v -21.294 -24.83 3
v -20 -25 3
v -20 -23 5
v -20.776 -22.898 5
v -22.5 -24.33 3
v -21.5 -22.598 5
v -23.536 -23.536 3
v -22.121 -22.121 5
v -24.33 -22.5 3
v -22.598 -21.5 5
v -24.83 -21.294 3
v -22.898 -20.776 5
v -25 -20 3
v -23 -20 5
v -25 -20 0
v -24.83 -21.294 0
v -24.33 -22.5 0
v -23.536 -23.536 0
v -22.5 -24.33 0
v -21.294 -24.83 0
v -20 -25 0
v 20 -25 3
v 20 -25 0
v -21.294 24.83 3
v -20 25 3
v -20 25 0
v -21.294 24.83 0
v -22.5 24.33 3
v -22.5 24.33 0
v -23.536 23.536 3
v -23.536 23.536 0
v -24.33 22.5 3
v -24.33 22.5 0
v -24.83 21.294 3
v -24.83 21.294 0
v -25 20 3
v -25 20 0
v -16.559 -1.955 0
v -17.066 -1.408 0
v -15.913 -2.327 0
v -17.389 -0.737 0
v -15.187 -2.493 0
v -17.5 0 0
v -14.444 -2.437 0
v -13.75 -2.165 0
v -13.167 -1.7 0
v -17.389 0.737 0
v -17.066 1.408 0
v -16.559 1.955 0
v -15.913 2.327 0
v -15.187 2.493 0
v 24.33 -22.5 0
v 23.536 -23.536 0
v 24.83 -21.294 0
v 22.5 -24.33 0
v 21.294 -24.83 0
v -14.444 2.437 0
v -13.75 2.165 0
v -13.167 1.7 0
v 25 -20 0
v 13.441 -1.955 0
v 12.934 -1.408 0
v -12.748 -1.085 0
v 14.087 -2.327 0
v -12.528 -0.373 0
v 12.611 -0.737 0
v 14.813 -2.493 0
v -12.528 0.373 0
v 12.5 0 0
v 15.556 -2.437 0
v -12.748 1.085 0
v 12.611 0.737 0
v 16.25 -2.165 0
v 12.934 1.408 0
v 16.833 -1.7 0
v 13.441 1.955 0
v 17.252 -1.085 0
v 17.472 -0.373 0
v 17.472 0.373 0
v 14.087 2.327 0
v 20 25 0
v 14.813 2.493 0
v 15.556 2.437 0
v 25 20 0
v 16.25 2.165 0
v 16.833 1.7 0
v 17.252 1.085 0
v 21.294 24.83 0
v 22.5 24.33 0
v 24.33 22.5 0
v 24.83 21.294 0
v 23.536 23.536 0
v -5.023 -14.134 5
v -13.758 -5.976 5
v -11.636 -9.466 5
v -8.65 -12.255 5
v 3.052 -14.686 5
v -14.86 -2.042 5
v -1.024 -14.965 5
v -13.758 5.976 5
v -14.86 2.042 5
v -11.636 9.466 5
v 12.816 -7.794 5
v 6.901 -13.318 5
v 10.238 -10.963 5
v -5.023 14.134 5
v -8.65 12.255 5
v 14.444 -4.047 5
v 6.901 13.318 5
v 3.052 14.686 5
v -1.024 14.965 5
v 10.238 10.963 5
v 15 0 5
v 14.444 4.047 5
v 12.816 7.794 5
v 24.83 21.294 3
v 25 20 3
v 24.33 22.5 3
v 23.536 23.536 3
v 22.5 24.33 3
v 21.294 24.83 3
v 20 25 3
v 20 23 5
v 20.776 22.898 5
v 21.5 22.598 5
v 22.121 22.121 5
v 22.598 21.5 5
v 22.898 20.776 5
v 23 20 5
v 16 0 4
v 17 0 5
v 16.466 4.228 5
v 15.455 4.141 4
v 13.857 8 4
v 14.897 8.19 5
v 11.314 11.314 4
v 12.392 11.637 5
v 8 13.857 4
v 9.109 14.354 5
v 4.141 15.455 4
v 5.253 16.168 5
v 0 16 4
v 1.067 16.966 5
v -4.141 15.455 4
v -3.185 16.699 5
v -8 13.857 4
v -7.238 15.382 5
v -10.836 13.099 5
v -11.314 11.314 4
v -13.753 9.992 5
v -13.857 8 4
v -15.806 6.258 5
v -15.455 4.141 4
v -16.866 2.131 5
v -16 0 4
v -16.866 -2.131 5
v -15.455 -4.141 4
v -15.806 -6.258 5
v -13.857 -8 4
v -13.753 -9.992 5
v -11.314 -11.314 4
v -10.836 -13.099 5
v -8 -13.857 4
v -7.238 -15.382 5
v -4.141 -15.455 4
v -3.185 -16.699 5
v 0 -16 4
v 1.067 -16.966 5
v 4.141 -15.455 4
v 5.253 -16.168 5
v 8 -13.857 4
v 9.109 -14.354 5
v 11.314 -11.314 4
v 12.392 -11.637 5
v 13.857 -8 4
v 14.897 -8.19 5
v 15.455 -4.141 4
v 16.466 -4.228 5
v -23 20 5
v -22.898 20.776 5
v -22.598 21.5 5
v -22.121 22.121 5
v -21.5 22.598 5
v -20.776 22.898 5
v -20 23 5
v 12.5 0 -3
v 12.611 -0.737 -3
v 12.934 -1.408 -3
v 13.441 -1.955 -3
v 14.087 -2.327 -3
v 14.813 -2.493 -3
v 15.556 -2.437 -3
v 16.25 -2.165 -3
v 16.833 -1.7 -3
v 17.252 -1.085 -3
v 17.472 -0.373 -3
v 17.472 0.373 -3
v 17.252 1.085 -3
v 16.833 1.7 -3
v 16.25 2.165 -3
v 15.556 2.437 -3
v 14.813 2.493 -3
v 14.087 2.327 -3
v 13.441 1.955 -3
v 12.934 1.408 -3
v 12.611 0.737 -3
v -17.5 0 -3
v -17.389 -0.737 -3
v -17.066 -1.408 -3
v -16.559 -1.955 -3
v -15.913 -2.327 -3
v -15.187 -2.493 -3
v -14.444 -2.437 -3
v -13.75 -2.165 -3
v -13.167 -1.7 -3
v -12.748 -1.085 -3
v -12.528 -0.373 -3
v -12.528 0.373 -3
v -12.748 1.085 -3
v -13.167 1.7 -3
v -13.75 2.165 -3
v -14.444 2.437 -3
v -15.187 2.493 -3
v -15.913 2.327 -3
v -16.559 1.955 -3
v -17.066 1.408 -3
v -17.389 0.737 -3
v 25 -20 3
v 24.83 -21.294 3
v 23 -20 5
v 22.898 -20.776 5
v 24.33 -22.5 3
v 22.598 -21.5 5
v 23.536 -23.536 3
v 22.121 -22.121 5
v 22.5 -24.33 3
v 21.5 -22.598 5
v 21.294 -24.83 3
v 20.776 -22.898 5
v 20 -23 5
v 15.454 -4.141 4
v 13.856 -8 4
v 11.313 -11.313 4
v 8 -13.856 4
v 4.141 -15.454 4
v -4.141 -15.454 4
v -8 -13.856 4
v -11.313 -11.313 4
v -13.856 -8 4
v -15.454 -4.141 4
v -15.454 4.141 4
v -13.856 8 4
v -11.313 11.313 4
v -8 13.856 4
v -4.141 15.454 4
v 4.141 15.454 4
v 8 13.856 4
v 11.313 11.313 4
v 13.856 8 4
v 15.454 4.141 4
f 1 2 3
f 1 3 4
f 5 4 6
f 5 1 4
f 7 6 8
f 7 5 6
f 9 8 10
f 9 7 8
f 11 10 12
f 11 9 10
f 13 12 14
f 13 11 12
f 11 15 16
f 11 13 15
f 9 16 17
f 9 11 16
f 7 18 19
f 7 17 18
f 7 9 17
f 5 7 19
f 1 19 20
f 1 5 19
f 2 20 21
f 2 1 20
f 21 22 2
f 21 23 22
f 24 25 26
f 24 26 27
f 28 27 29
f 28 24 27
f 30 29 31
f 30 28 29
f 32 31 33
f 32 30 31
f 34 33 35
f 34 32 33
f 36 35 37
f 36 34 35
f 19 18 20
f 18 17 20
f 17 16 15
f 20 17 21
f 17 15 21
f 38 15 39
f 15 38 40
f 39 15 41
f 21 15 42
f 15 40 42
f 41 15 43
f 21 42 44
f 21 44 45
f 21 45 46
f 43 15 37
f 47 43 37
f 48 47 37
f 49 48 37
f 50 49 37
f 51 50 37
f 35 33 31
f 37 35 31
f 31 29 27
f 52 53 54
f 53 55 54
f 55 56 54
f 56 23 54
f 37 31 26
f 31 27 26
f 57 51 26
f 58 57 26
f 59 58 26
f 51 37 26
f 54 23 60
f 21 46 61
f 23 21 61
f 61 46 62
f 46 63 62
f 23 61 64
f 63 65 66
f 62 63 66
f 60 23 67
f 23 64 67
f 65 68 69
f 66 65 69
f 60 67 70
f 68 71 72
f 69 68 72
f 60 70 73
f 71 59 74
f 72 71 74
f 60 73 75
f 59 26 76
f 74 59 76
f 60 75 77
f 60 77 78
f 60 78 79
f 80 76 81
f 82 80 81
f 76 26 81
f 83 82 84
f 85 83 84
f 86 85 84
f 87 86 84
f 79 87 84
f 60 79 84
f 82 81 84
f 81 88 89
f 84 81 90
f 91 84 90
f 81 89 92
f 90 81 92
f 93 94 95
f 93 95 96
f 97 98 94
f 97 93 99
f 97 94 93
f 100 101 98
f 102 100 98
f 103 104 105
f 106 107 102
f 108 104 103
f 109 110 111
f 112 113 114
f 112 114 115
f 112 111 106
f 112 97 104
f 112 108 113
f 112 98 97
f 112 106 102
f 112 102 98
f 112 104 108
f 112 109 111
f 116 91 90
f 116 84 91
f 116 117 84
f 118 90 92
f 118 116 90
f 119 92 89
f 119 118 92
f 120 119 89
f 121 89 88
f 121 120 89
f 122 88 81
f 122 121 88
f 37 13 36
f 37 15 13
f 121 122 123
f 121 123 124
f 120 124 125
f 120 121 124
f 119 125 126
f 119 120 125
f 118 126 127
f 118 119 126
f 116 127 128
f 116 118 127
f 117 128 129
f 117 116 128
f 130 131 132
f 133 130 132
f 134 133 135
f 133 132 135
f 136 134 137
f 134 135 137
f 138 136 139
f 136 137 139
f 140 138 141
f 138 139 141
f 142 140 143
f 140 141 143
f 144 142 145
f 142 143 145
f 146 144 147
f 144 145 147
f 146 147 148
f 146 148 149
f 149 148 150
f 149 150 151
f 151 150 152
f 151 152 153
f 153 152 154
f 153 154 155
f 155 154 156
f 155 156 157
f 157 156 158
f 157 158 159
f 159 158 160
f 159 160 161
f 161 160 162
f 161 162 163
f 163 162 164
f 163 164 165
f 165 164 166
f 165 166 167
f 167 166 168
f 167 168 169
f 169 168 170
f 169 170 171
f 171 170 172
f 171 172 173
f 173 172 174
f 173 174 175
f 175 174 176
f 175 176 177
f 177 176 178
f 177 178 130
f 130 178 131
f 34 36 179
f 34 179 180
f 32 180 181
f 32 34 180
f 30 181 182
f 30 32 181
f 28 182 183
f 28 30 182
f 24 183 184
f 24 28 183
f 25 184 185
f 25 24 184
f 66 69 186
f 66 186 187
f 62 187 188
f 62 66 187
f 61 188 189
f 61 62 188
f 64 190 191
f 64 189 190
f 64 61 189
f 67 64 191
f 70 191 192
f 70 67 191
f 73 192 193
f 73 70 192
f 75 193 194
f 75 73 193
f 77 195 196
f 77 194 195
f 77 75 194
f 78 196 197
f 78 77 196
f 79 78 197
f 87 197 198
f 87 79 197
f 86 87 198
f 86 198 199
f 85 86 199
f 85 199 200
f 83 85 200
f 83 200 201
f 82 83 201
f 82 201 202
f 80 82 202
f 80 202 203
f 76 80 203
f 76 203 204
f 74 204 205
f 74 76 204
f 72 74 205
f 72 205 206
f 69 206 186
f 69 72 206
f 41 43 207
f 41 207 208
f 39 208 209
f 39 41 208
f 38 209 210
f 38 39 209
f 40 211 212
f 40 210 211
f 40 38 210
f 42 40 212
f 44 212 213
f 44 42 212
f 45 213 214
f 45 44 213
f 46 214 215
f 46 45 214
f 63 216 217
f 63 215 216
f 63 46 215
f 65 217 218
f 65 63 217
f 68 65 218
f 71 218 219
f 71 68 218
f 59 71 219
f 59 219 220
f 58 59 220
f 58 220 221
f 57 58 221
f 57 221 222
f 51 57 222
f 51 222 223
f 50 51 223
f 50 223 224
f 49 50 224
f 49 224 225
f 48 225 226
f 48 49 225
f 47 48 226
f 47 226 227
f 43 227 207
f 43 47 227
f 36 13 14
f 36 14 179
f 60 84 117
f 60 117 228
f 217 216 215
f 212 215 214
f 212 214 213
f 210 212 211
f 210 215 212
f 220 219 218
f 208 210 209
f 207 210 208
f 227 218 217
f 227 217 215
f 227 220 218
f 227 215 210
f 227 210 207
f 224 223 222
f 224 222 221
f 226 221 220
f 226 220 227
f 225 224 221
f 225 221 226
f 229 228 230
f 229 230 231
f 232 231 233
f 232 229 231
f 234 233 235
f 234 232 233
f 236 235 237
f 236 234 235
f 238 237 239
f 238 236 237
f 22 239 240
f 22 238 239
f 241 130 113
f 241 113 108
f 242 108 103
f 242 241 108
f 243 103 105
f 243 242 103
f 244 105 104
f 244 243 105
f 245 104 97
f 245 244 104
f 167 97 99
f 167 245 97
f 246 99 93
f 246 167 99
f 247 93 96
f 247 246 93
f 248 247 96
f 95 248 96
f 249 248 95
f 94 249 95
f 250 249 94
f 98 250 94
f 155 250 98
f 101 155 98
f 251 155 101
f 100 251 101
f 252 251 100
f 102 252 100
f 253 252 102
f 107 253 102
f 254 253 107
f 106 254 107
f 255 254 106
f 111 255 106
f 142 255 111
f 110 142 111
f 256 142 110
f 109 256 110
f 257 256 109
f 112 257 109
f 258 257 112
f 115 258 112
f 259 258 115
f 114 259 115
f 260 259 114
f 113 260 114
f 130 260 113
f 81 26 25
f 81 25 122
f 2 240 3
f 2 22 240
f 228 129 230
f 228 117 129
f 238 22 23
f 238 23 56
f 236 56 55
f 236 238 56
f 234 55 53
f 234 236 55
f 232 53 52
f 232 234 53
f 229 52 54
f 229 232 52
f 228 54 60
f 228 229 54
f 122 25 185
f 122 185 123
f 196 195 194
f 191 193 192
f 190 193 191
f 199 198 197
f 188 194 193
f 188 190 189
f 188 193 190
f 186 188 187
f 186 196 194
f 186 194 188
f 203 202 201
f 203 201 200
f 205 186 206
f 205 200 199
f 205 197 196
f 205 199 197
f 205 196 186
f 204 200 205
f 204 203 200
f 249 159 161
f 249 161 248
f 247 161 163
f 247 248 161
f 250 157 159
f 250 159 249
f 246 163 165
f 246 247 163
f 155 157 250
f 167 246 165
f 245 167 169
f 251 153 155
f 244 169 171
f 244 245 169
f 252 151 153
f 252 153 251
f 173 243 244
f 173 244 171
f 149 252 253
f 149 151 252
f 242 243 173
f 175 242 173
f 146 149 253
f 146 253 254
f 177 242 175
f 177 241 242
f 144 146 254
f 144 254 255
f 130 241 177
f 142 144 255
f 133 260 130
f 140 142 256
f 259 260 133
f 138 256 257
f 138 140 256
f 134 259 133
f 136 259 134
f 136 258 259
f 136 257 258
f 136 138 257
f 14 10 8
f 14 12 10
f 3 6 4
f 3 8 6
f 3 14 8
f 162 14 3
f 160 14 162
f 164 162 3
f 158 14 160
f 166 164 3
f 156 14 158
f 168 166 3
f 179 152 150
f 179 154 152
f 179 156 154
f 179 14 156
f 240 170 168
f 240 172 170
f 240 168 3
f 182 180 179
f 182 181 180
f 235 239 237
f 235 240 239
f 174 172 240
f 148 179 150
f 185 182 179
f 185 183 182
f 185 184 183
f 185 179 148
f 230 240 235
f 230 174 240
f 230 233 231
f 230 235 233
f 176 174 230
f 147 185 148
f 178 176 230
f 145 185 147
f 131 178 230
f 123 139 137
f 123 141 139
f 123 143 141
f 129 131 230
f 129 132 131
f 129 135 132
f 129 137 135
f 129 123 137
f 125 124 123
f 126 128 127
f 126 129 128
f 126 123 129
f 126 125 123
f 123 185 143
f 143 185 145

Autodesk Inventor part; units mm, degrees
ref_plane "YZ Plane" through (0, 0, 0) normal (1, 0, 0) x (0, 1, 0)
ref_plane "XZ Plane" through (0, 0, 0) normal (0, 1, 0) x (-1, 0, 0)
ref_plane "XY Plane" through (0, 0, 0) normal (0, 0, 1) x (1, 0, 0)
sketch "Sketch1" plane through (0, 0, 0) normal (0, 0, 1) x (1, 0, 0)
  line L0 (-25, 25) -> (25, 25)
  line L1 (25, 25) -> (25, -25)
  line L2 (25, -25) -> (-25, -25)
  line L3 (-25, -25) -> (-25, 25)
  point P0 (0, 0)
  dimension "d0" = 50
  dimension "d1" = 50
  dimension "d2" = 25
  dimension "d3" = 25
extrude "Extrusion1" add sketch "Sketch1" along normal blind 5
fillet "Fillet1" radius 5 4 edges at (-25, -25, 2.5) (25, -25, 2.5) (25, 25, 2.5) (-25, 25, 2.5)
chamfer "Chamfer1" distance 2 angle 45 8 edges at (0, -25, 5) (23.5355, -23.5355, 5) (25, 0, 5) (23.5355, 23.5355, 5) (0, 25, 5) (-23.5355, 23.5355, 5) (-25, 0, 5) (-23.5355, -23.5355, 5)
sketch "Sketch3" plane through (0, 0, 0) normal (0, 0, -1) x (-1, 0, 0)
  circle A0 centre (-15, 0) radius 2.5
  circle A1 centre (15, 0) radius 2.5
  line L0 (-25, -20) -> (-25, 20) projected
  line L1 (25, 20) -> (25, -20) projected
  line L2 (20, -25) -> (-20, -25) projected
  point P0 (0, 0)
  point P1 (0, 0)
  dimension "d13" = 5
  dimension "d19" = 10
  dimension "d20" = 10
  dimension "d21" = 25
  dimension "d22" = 25
  dimension "d23" = 5
extrude "Extrusion3" add sketch "Sketch3" along normal blind 3
sketch "Sketch4" plane through (0, 0, 5) normal (0, 0, 1) x (1, 0, 0)
  circle A0 centre (0, 0) radius 15
  circle A1 centre (0, 0) radius 17
  dimension "d24" = 30
  dimension "d25" = 2
extrude "Extrusion4" cut sketch "Sketch4" against normal blind 1
chamfer "Chamfer3" distance 1 angle 45 2 edges at (-15, 0, 4) (-17, 0, 4)
properties part number "Top"
